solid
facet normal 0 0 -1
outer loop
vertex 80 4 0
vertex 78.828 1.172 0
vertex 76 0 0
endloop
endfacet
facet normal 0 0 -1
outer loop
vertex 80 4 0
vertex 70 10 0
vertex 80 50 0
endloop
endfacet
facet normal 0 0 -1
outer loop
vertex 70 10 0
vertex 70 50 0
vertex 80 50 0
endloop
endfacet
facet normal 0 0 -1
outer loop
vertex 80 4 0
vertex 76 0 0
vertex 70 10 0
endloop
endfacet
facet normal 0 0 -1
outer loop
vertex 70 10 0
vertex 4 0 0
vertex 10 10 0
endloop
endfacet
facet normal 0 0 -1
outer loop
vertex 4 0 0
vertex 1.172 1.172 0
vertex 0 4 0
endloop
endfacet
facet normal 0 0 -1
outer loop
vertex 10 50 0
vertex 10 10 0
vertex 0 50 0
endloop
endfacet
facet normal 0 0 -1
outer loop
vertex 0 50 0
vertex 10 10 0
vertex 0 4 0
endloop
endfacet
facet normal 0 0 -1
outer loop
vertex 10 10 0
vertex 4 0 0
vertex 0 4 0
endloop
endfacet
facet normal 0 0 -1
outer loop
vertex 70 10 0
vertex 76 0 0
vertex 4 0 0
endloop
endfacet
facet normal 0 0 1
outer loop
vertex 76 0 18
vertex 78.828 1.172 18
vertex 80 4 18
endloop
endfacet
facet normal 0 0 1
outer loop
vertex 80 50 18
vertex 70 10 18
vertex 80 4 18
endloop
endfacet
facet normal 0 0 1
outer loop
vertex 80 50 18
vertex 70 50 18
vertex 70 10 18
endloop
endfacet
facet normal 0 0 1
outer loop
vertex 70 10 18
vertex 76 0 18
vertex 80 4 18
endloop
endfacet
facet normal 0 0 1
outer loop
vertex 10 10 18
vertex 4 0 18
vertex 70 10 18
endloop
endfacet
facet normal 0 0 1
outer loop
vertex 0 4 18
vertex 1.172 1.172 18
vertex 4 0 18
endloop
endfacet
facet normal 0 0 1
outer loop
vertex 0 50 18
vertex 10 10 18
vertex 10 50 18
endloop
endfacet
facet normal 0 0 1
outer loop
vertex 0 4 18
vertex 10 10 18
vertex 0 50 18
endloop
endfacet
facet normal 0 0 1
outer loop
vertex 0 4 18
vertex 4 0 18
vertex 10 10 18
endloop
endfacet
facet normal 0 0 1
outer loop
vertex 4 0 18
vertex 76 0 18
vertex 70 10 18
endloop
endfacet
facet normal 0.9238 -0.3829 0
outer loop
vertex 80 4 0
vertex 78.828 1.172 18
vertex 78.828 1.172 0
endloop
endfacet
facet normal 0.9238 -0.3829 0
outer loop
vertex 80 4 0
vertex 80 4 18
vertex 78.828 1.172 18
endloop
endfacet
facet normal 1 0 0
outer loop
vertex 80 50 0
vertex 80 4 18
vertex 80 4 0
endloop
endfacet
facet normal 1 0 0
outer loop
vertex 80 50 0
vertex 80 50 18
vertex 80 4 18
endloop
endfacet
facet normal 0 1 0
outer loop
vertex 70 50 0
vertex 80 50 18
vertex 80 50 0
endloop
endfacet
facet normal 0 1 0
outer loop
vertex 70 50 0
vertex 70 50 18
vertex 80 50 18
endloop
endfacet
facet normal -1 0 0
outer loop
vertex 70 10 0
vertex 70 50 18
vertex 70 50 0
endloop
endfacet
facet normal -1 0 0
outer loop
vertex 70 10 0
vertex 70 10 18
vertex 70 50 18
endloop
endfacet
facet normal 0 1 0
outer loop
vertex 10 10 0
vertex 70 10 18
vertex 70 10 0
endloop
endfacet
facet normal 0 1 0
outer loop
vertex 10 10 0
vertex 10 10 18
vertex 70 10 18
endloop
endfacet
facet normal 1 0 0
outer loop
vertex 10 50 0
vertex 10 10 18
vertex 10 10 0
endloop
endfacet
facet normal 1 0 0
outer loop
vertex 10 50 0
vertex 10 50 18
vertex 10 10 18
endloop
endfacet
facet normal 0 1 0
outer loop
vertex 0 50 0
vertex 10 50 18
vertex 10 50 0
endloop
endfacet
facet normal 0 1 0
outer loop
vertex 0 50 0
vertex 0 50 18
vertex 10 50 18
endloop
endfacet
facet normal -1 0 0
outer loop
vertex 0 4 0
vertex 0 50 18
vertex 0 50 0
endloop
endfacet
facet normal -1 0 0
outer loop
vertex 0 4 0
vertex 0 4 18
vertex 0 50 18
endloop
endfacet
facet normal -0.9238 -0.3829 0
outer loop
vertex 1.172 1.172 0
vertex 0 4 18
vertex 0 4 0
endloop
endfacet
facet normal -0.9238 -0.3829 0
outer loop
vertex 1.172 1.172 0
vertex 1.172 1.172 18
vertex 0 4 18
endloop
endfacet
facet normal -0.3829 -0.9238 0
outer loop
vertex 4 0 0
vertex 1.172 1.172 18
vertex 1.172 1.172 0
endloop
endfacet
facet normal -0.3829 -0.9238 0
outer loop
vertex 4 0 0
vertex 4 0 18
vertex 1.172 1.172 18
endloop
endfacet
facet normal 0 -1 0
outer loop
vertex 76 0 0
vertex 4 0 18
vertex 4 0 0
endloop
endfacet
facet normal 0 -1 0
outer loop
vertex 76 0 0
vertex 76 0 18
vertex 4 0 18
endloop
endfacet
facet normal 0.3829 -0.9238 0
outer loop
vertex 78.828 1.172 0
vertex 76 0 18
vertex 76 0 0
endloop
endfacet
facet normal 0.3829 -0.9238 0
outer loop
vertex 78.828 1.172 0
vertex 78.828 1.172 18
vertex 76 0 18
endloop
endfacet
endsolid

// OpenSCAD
$fn = 32;

// ----------------------------------------------------------------------
// Heat sink frame: 80 x 50 mm frame, 10 mm walls
// ----------------------------------------------------------------------

// --- parameters (mm) ---
profile_height = 18;      // extrusion height
profile_points = 12;      // points of the closed outline

profile = [[0, 4], [1.172, 1.172], [4, 0], [76, 0], [78.828, 1.172], [80, 4], [80, 50], [70, 50], [70, 10], [10, 10], [10, 50], [0, 50]];  // single closed polygon, 12 points, counter clockwise

// --- the one profile operation ---
linear_extrude(height = profile_height) polygon(points = profile);
